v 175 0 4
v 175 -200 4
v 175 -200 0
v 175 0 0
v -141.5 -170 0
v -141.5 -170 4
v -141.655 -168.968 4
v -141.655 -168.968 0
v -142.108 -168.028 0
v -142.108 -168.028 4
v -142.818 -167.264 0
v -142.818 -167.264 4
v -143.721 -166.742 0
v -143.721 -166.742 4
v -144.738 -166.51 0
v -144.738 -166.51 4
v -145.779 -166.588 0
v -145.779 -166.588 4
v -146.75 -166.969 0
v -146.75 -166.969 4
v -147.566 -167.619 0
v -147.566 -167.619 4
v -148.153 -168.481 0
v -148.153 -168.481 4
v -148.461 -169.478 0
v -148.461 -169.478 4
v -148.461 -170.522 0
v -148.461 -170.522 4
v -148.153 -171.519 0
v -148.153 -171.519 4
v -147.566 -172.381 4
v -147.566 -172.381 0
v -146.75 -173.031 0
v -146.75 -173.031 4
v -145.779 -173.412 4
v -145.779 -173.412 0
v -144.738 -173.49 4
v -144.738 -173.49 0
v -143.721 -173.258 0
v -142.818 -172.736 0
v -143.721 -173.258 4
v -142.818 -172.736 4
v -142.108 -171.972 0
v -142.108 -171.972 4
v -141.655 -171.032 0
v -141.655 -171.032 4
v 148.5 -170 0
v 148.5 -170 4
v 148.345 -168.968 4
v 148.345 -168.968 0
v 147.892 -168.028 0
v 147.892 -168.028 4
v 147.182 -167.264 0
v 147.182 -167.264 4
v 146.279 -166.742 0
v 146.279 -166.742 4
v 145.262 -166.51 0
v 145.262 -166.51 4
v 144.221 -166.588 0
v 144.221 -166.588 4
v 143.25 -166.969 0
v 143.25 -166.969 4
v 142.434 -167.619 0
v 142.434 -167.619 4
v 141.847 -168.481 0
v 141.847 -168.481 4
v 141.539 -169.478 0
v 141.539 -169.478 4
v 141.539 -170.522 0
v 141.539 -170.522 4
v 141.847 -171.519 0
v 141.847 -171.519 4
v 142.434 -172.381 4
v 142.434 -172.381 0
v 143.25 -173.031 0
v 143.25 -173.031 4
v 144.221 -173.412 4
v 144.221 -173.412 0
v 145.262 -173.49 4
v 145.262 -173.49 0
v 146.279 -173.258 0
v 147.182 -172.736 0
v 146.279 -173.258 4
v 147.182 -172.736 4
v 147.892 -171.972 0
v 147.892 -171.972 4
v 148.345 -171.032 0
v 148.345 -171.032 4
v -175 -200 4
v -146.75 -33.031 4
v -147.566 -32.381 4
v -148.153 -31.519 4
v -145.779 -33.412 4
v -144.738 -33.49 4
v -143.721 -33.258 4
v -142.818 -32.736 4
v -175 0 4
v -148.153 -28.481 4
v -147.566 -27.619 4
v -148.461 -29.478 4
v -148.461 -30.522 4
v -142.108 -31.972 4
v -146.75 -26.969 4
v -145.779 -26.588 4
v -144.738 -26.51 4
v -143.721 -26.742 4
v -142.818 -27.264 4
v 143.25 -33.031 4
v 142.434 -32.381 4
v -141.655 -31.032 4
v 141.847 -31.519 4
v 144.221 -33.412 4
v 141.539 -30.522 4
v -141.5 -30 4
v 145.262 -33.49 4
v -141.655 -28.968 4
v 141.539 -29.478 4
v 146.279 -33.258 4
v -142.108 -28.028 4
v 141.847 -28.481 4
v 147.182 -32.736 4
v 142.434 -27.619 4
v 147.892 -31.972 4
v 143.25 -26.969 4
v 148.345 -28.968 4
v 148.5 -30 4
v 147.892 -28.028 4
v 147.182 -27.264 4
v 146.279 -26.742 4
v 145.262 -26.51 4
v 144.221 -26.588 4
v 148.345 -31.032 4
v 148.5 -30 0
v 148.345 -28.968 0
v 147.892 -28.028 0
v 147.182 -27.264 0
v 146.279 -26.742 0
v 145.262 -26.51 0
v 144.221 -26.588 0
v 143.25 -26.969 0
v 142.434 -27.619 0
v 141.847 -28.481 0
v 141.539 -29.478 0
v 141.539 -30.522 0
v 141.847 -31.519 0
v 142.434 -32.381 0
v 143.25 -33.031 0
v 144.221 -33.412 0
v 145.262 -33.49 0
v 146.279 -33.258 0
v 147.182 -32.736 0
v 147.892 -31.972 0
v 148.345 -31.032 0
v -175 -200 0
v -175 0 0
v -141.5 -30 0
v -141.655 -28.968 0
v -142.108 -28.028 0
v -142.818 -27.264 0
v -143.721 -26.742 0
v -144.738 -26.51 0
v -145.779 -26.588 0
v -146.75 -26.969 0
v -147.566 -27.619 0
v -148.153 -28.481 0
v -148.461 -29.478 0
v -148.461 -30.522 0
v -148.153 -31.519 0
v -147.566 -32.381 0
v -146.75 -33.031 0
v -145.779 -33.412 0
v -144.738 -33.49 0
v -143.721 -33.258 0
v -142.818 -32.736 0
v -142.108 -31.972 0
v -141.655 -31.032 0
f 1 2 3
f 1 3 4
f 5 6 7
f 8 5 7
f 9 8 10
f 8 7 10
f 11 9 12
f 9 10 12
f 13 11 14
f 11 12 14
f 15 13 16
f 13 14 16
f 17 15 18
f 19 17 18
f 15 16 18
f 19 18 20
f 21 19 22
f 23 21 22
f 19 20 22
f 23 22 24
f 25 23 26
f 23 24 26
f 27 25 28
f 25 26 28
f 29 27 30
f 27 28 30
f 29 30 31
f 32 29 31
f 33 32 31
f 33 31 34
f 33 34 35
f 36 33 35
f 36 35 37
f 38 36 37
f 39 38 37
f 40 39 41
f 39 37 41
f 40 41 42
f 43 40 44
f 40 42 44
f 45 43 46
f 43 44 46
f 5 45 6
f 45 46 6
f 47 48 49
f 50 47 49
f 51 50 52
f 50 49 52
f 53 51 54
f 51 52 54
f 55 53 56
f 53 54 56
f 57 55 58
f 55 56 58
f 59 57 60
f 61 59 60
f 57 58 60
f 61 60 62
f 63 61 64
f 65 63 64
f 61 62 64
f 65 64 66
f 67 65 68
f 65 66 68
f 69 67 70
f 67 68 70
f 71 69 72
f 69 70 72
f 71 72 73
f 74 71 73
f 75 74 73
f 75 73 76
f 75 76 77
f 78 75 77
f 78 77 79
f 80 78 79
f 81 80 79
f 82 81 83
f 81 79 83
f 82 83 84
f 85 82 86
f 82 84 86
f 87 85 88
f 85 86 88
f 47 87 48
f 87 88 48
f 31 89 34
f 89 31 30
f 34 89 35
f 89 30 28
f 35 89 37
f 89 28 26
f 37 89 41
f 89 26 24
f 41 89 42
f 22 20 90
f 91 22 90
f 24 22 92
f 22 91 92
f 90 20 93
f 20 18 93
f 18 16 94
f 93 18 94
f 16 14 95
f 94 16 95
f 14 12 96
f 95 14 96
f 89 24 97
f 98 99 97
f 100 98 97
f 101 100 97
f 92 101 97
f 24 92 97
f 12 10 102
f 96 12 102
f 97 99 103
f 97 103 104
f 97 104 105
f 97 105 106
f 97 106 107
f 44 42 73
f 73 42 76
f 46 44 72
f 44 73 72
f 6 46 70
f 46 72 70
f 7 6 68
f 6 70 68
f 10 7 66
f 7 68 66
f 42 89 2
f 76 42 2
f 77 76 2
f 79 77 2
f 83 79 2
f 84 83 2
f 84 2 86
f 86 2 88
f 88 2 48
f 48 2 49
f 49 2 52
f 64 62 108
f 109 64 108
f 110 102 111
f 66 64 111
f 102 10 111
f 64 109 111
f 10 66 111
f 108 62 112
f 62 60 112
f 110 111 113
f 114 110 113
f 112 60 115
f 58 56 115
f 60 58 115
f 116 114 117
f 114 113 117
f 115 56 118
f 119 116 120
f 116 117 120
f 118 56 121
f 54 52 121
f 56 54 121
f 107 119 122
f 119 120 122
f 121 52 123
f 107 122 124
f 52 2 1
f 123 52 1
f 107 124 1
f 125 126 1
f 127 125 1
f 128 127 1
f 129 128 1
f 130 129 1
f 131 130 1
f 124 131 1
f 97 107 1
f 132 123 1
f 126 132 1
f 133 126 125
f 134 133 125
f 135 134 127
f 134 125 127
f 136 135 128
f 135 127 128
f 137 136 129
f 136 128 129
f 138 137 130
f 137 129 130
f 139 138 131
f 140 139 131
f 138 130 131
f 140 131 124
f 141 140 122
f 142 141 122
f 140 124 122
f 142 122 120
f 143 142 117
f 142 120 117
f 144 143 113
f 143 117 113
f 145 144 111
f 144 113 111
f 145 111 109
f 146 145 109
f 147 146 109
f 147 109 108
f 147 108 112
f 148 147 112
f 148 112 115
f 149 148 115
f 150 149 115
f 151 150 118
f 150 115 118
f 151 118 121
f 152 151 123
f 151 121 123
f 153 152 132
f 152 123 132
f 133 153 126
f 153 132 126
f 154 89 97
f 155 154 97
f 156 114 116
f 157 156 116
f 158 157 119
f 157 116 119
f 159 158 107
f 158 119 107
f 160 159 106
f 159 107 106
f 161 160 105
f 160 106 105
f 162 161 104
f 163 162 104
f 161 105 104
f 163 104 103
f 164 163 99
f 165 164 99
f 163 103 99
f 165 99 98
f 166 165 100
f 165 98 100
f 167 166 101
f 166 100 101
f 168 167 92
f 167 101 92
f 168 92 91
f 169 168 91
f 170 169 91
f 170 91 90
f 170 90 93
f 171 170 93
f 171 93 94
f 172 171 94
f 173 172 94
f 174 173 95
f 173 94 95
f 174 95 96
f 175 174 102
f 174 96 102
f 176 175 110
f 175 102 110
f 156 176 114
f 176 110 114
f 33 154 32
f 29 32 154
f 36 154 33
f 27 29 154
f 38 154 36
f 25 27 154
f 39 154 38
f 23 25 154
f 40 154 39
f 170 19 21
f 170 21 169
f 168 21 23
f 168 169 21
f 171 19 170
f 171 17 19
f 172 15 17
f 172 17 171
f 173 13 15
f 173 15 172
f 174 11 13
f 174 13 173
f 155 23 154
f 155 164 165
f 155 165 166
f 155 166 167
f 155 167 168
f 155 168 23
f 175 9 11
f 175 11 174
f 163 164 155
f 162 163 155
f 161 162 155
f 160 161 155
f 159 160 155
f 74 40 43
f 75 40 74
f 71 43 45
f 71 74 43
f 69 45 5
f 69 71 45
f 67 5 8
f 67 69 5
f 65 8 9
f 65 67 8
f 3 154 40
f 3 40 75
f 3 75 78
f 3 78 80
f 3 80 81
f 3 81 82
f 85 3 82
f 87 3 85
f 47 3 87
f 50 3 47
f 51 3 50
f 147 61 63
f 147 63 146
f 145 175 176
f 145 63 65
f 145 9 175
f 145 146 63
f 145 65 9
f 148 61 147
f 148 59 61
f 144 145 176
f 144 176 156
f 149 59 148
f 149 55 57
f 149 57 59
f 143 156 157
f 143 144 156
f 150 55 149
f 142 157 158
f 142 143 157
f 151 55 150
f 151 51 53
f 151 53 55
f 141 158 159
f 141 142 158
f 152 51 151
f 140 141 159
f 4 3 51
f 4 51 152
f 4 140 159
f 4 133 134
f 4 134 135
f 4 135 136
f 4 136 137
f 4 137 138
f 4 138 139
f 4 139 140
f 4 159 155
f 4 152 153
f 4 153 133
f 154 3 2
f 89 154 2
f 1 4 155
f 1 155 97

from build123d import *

# Parameters (mm, degrees)
F0_W     = 200
F0_H     = 4
F1_DEPTH = 175
F2_R     = 3.5
F3_DEPTH = 4


with BuildPart() as f1:
    # F0 (on Right) → F1 (new body, symmetric)
    with BuildSketch(Plane.YZ):
        with Locations((-100, 2)):
            Rectangle(F0_W, F0_H)
    extrude(amount=F1_DEPTH, both=True)

    # F2 (on face) → F3 (cut, through all)
    with BuildSketch(Plane.XY.offset(4)):
        with Locations((-145, -170)):
            Circle(F2_R)
        with Locations((-145, -30)):
            Circle(F2_R)
        with Locations((145, -30)):
            Circle(F2_R)
        with Locations((145, -170)):
            Circle(F2_R)
    extrude(amount=-F3_DEPTH, mode=Mode.SUBTRACT)


solid = f1.part
